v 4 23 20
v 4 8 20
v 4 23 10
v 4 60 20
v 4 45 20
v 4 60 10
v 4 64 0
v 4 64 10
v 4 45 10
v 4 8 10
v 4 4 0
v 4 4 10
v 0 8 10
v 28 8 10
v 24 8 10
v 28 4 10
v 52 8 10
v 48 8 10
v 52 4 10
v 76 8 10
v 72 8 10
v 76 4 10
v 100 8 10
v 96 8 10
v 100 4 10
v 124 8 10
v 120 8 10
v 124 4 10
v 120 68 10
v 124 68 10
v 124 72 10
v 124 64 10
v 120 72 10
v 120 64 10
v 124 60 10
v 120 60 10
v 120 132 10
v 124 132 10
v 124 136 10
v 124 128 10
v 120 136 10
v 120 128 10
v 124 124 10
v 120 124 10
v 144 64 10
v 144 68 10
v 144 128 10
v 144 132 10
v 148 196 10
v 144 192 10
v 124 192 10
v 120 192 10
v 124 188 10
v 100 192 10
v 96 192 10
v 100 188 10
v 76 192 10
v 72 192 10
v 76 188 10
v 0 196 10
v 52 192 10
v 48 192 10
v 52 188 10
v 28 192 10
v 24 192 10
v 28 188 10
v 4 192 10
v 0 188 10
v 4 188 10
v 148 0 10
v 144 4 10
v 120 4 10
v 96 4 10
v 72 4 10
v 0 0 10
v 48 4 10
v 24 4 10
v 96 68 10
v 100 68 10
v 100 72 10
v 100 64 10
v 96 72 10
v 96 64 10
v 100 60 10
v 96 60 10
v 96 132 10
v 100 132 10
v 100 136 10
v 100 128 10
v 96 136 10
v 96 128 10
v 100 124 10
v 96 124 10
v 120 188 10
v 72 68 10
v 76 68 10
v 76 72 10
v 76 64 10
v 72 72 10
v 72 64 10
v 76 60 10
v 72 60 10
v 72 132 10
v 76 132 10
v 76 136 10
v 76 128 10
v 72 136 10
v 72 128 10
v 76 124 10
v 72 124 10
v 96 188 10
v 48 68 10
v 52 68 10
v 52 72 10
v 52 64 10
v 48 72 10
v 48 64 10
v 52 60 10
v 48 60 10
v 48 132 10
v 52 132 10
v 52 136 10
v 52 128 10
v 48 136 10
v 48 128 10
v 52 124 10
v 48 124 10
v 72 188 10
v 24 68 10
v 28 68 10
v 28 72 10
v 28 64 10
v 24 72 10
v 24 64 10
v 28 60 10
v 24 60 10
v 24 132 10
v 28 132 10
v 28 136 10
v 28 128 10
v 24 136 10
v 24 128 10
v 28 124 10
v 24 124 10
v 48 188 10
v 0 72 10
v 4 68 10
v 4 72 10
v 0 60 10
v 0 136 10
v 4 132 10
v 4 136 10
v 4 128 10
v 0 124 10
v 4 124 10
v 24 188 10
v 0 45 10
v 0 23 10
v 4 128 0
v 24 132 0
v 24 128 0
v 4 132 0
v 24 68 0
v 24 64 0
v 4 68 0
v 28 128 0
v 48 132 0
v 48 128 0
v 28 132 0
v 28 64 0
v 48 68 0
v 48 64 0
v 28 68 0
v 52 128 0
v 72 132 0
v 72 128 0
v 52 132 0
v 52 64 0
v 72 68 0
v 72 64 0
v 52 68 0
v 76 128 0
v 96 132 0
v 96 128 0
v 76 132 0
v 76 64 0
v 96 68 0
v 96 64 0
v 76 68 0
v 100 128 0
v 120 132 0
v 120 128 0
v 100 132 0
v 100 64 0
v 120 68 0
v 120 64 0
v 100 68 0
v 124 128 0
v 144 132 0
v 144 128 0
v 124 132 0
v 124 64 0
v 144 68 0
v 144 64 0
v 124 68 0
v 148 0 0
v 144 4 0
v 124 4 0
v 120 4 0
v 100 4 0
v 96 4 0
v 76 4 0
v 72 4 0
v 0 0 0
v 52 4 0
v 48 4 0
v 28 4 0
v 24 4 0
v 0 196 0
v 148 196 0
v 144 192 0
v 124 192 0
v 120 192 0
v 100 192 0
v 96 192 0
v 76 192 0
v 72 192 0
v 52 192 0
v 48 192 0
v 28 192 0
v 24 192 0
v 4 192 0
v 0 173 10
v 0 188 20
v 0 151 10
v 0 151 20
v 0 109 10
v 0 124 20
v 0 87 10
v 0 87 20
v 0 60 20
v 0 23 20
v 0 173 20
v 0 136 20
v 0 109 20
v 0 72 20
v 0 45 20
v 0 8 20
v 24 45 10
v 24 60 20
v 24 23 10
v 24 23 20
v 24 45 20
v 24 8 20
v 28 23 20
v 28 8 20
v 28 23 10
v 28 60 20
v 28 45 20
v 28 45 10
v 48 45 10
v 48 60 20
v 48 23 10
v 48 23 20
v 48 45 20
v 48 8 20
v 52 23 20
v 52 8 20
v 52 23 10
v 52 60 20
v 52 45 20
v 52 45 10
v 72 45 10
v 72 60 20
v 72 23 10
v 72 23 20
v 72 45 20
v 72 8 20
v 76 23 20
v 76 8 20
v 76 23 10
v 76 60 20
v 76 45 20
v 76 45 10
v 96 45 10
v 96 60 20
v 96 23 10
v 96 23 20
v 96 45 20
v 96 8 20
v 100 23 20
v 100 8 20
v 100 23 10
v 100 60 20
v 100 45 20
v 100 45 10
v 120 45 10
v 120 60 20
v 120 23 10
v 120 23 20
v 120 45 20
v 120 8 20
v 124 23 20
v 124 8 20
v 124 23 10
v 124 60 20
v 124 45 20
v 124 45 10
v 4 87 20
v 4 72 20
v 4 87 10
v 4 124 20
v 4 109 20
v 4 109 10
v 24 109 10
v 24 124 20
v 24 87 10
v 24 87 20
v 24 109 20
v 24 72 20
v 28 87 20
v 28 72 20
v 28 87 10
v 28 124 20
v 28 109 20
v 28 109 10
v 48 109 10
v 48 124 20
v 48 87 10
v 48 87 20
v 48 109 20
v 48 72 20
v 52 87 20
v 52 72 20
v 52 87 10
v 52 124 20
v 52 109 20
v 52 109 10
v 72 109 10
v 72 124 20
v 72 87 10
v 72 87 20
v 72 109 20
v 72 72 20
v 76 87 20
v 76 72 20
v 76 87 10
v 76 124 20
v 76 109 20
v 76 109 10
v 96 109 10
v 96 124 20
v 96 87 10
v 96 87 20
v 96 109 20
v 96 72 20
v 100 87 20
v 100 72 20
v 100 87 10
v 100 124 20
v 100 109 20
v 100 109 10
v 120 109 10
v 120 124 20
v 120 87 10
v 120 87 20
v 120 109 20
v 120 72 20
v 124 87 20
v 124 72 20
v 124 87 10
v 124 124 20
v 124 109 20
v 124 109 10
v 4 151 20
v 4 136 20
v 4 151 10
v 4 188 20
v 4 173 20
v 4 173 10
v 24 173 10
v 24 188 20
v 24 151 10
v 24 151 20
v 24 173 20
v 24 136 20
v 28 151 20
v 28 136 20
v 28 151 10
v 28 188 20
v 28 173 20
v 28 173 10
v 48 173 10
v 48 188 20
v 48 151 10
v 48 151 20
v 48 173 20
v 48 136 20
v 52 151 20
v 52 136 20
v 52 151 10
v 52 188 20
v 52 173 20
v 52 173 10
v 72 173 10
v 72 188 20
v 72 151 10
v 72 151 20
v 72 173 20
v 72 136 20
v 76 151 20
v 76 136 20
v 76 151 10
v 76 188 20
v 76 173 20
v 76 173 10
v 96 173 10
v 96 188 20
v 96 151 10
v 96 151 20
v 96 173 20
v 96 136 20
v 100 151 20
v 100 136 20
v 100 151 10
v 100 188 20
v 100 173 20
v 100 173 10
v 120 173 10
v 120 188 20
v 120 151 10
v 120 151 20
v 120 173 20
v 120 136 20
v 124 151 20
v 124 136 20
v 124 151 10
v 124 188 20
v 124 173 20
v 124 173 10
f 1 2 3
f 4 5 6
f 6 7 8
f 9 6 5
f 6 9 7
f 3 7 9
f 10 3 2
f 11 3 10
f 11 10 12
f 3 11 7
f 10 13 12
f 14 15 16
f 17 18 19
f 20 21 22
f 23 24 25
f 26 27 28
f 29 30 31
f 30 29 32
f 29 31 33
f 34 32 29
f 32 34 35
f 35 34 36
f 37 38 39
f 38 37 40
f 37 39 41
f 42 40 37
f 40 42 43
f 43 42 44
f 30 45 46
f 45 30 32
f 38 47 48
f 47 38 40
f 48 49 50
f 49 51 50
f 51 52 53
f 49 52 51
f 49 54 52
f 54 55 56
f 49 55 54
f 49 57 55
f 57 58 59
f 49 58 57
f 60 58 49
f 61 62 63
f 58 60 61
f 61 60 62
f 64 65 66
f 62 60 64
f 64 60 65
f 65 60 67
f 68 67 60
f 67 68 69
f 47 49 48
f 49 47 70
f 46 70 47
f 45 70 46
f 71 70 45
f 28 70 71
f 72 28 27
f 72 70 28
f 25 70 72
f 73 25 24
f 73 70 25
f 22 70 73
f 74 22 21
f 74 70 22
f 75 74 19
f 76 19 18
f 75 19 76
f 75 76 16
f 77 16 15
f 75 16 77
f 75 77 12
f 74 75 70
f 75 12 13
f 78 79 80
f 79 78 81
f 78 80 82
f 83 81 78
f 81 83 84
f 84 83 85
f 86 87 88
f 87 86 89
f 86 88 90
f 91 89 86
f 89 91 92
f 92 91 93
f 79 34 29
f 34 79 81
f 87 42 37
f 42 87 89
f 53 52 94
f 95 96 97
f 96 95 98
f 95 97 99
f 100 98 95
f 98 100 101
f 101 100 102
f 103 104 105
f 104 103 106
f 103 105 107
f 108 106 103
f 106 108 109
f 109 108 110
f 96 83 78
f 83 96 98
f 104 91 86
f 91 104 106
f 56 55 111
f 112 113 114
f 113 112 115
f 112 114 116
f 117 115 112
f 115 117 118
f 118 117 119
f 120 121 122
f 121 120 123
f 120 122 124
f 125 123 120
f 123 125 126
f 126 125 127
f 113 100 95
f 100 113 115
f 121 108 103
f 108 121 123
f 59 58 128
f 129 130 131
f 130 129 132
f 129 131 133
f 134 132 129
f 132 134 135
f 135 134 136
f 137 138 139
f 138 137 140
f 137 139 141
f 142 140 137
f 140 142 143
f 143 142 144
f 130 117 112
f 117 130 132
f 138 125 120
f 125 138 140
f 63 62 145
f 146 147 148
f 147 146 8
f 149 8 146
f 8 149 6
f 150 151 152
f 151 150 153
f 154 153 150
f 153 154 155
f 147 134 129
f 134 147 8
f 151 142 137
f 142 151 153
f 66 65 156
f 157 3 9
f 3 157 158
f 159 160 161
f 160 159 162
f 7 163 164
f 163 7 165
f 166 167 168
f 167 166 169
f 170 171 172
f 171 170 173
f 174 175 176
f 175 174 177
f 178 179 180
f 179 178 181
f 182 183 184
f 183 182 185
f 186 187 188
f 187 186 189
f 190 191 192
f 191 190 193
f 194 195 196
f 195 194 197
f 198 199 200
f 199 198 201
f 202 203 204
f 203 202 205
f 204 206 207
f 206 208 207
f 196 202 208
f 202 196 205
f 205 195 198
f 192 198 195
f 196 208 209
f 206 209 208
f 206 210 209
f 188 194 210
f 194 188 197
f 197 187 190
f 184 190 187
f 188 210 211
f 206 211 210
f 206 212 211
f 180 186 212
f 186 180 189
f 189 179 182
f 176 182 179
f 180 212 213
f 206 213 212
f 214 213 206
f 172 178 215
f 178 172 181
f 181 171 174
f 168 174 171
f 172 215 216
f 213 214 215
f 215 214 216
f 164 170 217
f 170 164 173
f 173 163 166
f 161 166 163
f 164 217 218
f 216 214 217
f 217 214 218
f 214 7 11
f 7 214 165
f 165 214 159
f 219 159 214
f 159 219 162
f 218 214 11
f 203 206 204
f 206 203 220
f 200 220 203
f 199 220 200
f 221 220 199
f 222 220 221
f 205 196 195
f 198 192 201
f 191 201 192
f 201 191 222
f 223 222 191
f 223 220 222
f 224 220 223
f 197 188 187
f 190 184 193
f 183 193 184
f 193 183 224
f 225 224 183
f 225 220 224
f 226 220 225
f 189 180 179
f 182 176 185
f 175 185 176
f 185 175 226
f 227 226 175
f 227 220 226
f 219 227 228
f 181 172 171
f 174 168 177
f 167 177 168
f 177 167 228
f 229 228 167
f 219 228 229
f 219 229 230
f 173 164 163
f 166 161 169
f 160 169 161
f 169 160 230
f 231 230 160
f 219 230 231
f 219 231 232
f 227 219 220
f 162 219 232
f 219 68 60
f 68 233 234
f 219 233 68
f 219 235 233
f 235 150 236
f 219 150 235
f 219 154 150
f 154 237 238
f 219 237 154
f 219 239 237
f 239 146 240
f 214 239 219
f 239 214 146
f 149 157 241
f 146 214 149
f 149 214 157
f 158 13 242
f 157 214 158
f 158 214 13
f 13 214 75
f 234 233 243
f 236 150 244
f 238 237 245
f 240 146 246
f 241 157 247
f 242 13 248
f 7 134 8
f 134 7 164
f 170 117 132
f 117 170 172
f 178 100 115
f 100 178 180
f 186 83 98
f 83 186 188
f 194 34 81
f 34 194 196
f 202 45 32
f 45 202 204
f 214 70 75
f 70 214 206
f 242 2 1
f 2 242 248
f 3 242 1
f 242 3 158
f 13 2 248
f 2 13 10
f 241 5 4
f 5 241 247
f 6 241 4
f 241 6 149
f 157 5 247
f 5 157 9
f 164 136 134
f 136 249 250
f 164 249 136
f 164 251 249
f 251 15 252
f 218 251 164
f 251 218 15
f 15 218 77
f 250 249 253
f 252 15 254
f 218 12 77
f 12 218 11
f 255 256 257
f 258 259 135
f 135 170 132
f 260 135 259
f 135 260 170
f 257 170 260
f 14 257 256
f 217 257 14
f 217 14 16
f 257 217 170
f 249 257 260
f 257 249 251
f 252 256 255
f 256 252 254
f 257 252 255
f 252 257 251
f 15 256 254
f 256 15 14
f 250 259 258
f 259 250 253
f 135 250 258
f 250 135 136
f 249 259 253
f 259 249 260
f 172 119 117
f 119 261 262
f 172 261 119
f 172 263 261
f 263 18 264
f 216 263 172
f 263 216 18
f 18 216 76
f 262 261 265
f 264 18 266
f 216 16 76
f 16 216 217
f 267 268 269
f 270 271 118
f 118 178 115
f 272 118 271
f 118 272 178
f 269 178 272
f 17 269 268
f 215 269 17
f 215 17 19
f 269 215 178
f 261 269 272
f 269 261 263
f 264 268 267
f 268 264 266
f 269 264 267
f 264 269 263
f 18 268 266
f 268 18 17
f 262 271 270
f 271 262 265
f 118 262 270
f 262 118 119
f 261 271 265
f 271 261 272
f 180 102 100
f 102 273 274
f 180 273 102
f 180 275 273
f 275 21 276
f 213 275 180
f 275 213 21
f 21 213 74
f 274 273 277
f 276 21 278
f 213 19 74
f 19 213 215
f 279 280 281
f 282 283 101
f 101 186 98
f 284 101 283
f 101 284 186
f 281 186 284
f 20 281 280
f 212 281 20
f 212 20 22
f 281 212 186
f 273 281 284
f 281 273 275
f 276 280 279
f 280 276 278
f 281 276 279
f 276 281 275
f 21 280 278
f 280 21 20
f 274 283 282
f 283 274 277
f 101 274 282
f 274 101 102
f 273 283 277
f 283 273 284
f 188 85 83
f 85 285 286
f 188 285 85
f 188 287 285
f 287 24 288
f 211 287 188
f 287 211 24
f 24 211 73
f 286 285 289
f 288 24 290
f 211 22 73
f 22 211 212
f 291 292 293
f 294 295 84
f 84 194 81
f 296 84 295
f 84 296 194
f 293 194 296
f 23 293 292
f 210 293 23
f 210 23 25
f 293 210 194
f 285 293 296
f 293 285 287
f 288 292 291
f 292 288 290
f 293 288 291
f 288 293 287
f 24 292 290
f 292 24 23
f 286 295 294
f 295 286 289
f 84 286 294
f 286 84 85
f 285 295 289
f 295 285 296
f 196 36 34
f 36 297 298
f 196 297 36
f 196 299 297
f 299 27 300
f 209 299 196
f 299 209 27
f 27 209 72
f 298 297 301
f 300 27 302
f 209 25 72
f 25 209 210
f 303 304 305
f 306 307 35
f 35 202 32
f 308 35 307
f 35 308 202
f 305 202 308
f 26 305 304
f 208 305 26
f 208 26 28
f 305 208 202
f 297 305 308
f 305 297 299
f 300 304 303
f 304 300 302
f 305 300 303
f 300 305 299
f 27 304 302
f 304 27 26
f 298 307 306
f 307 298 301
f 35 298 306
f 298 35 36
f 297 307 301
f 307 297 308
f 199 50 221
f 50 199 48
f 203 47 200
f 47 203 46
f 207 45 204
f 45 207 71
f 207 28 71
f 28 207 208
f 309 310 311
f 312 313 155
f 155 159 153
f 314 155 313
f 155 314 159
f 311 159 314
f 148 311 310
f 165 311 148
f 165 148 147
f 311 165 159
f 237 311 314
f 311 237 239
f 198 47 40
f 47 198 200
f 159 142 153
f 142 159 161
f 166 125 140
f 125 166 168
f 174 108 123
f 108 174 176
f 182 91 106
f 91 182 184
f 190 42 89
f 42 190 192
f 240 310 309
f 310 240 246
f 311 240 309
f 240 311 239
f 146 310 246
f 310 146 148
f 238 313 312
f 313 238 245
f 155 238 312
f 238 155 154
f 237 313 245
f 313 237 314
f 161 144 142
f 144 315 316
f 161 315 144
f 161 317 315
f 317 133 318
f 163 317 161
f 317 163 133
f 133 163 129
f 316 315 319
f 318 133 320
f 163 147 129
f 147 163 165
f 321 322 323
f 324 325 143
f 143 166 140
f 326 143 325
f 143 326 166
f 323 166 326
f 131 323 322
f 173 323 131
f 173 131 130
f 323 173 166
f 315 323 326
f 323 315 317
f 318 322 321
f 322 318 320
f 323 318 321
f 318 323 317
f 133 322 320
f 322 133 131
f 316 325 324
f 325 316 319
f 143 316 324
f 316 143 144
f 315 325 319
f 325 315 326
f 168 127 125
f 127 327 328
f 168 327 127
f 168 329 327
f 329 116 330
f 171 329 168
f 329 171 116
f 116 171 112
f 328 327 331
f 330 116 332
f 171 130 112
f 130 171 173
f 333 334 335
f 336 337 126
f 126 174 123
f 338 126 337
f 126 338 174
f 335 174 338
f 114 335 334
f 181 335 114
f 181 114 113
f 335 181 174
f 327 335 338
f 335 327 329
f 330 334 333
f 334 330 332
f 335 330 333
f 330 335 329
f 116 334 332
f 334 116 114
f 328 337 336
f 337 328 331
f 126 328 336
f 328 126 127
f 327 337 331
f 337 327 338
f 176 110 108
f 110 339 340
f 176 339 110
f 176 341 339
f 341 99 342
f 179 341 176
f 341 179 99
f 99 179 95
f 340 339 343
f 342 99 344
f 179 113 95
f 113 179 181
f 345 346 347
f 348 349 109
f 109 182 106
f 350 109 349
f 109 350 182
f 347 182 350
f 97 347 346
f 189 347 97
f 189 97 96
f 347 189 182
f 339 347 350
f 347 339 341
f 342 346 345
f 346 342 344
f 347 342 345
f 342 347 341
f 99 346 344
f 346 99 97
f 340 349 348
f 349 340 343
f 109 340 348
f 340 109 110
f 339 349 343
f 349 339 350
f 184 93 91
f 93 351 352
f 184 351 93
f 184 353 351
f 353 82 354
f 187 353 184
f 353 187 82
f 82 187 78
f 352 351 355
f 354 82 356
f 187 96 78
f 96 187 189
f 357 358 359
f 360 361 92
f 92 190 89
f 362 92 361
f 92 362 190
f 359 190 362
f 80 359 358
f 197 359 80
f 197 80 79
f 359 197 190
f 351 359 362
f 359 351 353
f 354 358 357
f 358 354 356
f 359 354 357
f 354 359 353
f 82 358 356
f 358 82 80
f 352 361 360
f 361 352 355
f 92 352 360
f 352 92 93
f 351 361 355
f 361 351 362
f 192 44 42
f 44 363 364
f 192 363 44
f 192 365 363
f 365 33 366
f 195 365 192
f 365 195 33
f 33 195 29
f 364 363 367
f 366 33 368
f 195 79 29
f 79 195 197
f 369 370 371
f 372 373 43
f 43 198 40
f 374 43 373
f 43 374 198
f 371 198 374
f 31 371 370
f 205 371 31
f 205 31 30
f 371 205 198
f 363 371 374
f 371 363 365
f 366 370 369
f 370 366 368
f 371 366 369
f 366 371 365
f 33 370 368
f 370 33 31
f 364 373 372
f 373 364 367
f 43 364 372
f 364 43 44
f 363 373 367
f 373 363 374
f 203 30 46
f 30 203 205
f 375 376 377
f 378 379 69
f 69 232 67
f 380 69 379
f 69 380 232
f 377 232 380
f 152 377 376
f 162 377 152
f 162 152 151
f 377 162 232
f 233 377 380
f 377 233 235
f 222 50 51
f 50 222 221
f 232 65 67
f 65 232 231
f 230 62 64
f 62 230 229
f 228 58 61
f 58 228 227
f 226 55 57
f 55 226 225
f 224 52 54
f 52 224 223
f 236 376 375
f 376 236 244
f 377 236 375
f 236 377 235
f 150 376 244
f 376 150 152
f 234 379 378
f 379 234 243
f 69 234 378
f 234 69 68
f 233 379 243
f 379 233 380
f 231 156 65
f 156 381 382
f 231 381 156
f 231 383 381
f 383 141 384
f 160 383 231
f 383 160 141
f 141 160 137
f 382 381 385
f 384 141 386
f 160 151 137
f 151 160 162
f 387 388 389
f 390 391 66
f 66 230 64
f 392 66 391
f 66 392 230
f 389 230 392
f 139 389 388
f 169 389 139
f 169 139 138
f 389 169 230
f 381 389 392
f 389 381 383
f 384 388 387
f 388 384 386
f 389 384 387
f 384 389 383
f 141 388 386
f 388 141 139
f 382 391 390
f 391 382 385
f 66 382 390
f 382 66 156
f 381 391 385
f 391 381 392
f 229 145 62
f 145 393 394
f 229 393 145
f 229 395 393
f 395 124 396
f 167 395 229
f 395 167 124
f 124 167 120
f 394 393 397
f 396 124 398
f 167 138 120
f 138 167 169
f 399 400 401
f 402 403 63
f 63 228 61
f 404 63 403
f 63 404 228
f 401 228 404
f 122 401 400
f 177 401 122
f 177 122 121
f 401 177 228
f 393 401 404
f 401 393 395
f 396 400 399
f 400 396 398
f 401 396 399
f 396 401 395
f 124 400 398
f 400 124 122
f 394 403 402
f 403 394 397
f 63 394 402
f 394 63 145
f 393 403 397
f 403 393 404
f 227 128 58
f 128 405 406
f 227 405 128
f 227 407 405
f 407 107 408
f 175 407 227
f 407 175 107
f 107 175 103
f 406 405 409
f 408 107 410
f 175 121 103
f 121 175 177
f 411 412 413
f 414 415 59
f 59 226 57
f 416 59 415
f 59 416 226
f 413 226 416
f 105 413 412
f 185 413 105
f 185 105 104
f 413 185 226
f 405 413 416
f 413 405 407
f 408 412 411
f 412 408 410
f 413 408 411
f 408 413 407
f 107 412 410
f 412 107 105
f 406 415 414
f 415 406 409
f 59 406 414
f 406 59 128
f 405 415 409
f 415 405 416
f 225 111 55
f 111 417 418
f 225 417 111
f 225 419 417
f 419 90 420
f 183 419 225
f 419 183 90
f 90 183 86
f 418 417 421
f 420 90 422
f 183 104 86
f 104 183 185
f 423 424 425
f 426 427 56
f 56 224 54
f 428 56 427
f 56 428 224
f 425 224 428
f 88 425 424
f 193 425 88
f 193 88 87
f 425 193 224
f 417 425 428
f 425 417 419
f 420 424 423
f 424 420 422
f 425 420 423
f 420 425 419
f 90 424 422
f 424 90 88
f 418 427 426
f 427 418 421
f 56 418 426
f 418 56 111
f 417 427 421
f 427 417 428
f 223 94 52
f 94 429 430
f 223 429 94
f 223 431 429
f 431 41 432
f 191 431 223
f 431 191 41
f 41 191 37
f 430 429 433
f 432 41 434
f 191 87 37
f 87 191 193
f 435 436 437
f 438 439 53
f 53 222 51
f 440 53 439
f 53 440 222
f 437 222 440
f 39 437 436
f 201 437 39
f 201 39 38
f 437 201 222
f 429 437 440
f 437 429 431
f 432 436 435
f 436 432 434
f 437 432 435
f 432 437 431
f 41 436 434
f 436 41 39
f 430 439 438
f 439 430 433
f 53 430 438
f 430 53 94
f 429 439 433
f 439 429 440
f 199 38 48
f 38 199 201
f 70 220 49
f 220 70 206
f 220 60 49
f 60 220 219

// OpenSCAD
/********************************
	CARD DECK HOLDER

Author: Luke Phillips
version 1.0 - 14-December-2017

This work is licensed under a 
Creative Commons Attribution-NonCommercial-ShareAlike 4.0 International License.

*********************************/

/************ USER MODIFIABLE VARIABLES *************/
// These should reflect the size of your card decks, including some gap allowance 
stack_width=60; // width of the cards themselves (+ allowance)
stack_depth=20; // the height of the piles of cards you wish to hold (+ allowance)

// optionally you can create a floor by setting the height > 0
floor_height=0;

// dimensions of the main wall at the base of the holder
wall_width=4;
wall_height=10; // this doesn't need to be very tall, just enough to stop the cards sliding around. Make the cards more upright by extending the prongs instead, this will save plastic.

// dimensions of the extra card holding "prongs"
prong_width=15;
prong_height=10;

/************ USES *************/
CardDeckHolder(3, 6);
//CardDeckHolderClip();



/************ MODULES **********/
// calculated values
full_wall_height = wall_height + floor_height;
holder_width=stack_width+wall_width;
holder_depth=wall_width+stack_depth;


// modules for parts of the holder
module FrontWall() {
	cube([wall_width, holder_width, full_wall_height]);
}
module SideWall() {
	cube([stack_depth, wall_width, full_wall_height]);
}
module CardProng() {
	cube([wall_width, prong_width, prong_height]);
}
module FloorPiece() {
	cube([stack_depth, stack_width, floor_height]);
}

module BasicStackHolder() {
	// NOTE Only creates rear and left walls, front and right walls are added after the  been repetitions in the main CardDeckHolder module
	
	FrontWall(); // actually rear wall :)
	translate([0, 2*wall_width, full_wall_height]) 
		CardProng();
	translate([0, stack_width - prong_width, full_wall_height]) 
		CardProng();
	translate([wall_width, 0, 0]) 
		SideWall(); // left side
	translate([wall_width, wall_width, 0]) 
		FloorPiece();
}

module CardDeckHolder(holdersWide, holdersDeep) {

	// build the holders "wide"
	for(w=[0:holdersWide-1]) {
		// build the holders "deep"
		for(d=[0:holdersDeep-1]) {
			translate([d*holder_depth, w*holder_width, 0]) BasicStackHolder();
		}
	}
	
	// build the final front and side walls
	translate([holdersDeep*holder_depth, 0, 0]) 
		cube([wall_width,
			holdersWide*holder_width, 
			full_wall_height]);
	
	translate([0, holdersWide*holder_width, 0]) 
		cube([holdersDeep*holder_depth + wall_width,
			wall_width, 
			full_wall_height]);
	
}


/********************************
	CARD DECK HOLDER CLIPS

These will help stop multi-part card deck holders from moving around.

They are not really designed to make the holders rigid just stop 
a bit of the lateral movement

*********************************/
clip_wall_width=2;
fudge_factor=1.2;

module ClipWall() {
	cube([stack_depth - fudge_factor, clip_wall_width, wall_height - fudge_factor]);
}

module CardDeckHolderClip() {
	ClipWall();
	translate([0, clip_wall_width, 0]) cube([stack_depth - fudge_factor, 2*wall_width + fudge_factor, clip_wall_width]);
	translate([0, clip_wall_width + 2*wall_width, 0]) ClipWall();
	
}
